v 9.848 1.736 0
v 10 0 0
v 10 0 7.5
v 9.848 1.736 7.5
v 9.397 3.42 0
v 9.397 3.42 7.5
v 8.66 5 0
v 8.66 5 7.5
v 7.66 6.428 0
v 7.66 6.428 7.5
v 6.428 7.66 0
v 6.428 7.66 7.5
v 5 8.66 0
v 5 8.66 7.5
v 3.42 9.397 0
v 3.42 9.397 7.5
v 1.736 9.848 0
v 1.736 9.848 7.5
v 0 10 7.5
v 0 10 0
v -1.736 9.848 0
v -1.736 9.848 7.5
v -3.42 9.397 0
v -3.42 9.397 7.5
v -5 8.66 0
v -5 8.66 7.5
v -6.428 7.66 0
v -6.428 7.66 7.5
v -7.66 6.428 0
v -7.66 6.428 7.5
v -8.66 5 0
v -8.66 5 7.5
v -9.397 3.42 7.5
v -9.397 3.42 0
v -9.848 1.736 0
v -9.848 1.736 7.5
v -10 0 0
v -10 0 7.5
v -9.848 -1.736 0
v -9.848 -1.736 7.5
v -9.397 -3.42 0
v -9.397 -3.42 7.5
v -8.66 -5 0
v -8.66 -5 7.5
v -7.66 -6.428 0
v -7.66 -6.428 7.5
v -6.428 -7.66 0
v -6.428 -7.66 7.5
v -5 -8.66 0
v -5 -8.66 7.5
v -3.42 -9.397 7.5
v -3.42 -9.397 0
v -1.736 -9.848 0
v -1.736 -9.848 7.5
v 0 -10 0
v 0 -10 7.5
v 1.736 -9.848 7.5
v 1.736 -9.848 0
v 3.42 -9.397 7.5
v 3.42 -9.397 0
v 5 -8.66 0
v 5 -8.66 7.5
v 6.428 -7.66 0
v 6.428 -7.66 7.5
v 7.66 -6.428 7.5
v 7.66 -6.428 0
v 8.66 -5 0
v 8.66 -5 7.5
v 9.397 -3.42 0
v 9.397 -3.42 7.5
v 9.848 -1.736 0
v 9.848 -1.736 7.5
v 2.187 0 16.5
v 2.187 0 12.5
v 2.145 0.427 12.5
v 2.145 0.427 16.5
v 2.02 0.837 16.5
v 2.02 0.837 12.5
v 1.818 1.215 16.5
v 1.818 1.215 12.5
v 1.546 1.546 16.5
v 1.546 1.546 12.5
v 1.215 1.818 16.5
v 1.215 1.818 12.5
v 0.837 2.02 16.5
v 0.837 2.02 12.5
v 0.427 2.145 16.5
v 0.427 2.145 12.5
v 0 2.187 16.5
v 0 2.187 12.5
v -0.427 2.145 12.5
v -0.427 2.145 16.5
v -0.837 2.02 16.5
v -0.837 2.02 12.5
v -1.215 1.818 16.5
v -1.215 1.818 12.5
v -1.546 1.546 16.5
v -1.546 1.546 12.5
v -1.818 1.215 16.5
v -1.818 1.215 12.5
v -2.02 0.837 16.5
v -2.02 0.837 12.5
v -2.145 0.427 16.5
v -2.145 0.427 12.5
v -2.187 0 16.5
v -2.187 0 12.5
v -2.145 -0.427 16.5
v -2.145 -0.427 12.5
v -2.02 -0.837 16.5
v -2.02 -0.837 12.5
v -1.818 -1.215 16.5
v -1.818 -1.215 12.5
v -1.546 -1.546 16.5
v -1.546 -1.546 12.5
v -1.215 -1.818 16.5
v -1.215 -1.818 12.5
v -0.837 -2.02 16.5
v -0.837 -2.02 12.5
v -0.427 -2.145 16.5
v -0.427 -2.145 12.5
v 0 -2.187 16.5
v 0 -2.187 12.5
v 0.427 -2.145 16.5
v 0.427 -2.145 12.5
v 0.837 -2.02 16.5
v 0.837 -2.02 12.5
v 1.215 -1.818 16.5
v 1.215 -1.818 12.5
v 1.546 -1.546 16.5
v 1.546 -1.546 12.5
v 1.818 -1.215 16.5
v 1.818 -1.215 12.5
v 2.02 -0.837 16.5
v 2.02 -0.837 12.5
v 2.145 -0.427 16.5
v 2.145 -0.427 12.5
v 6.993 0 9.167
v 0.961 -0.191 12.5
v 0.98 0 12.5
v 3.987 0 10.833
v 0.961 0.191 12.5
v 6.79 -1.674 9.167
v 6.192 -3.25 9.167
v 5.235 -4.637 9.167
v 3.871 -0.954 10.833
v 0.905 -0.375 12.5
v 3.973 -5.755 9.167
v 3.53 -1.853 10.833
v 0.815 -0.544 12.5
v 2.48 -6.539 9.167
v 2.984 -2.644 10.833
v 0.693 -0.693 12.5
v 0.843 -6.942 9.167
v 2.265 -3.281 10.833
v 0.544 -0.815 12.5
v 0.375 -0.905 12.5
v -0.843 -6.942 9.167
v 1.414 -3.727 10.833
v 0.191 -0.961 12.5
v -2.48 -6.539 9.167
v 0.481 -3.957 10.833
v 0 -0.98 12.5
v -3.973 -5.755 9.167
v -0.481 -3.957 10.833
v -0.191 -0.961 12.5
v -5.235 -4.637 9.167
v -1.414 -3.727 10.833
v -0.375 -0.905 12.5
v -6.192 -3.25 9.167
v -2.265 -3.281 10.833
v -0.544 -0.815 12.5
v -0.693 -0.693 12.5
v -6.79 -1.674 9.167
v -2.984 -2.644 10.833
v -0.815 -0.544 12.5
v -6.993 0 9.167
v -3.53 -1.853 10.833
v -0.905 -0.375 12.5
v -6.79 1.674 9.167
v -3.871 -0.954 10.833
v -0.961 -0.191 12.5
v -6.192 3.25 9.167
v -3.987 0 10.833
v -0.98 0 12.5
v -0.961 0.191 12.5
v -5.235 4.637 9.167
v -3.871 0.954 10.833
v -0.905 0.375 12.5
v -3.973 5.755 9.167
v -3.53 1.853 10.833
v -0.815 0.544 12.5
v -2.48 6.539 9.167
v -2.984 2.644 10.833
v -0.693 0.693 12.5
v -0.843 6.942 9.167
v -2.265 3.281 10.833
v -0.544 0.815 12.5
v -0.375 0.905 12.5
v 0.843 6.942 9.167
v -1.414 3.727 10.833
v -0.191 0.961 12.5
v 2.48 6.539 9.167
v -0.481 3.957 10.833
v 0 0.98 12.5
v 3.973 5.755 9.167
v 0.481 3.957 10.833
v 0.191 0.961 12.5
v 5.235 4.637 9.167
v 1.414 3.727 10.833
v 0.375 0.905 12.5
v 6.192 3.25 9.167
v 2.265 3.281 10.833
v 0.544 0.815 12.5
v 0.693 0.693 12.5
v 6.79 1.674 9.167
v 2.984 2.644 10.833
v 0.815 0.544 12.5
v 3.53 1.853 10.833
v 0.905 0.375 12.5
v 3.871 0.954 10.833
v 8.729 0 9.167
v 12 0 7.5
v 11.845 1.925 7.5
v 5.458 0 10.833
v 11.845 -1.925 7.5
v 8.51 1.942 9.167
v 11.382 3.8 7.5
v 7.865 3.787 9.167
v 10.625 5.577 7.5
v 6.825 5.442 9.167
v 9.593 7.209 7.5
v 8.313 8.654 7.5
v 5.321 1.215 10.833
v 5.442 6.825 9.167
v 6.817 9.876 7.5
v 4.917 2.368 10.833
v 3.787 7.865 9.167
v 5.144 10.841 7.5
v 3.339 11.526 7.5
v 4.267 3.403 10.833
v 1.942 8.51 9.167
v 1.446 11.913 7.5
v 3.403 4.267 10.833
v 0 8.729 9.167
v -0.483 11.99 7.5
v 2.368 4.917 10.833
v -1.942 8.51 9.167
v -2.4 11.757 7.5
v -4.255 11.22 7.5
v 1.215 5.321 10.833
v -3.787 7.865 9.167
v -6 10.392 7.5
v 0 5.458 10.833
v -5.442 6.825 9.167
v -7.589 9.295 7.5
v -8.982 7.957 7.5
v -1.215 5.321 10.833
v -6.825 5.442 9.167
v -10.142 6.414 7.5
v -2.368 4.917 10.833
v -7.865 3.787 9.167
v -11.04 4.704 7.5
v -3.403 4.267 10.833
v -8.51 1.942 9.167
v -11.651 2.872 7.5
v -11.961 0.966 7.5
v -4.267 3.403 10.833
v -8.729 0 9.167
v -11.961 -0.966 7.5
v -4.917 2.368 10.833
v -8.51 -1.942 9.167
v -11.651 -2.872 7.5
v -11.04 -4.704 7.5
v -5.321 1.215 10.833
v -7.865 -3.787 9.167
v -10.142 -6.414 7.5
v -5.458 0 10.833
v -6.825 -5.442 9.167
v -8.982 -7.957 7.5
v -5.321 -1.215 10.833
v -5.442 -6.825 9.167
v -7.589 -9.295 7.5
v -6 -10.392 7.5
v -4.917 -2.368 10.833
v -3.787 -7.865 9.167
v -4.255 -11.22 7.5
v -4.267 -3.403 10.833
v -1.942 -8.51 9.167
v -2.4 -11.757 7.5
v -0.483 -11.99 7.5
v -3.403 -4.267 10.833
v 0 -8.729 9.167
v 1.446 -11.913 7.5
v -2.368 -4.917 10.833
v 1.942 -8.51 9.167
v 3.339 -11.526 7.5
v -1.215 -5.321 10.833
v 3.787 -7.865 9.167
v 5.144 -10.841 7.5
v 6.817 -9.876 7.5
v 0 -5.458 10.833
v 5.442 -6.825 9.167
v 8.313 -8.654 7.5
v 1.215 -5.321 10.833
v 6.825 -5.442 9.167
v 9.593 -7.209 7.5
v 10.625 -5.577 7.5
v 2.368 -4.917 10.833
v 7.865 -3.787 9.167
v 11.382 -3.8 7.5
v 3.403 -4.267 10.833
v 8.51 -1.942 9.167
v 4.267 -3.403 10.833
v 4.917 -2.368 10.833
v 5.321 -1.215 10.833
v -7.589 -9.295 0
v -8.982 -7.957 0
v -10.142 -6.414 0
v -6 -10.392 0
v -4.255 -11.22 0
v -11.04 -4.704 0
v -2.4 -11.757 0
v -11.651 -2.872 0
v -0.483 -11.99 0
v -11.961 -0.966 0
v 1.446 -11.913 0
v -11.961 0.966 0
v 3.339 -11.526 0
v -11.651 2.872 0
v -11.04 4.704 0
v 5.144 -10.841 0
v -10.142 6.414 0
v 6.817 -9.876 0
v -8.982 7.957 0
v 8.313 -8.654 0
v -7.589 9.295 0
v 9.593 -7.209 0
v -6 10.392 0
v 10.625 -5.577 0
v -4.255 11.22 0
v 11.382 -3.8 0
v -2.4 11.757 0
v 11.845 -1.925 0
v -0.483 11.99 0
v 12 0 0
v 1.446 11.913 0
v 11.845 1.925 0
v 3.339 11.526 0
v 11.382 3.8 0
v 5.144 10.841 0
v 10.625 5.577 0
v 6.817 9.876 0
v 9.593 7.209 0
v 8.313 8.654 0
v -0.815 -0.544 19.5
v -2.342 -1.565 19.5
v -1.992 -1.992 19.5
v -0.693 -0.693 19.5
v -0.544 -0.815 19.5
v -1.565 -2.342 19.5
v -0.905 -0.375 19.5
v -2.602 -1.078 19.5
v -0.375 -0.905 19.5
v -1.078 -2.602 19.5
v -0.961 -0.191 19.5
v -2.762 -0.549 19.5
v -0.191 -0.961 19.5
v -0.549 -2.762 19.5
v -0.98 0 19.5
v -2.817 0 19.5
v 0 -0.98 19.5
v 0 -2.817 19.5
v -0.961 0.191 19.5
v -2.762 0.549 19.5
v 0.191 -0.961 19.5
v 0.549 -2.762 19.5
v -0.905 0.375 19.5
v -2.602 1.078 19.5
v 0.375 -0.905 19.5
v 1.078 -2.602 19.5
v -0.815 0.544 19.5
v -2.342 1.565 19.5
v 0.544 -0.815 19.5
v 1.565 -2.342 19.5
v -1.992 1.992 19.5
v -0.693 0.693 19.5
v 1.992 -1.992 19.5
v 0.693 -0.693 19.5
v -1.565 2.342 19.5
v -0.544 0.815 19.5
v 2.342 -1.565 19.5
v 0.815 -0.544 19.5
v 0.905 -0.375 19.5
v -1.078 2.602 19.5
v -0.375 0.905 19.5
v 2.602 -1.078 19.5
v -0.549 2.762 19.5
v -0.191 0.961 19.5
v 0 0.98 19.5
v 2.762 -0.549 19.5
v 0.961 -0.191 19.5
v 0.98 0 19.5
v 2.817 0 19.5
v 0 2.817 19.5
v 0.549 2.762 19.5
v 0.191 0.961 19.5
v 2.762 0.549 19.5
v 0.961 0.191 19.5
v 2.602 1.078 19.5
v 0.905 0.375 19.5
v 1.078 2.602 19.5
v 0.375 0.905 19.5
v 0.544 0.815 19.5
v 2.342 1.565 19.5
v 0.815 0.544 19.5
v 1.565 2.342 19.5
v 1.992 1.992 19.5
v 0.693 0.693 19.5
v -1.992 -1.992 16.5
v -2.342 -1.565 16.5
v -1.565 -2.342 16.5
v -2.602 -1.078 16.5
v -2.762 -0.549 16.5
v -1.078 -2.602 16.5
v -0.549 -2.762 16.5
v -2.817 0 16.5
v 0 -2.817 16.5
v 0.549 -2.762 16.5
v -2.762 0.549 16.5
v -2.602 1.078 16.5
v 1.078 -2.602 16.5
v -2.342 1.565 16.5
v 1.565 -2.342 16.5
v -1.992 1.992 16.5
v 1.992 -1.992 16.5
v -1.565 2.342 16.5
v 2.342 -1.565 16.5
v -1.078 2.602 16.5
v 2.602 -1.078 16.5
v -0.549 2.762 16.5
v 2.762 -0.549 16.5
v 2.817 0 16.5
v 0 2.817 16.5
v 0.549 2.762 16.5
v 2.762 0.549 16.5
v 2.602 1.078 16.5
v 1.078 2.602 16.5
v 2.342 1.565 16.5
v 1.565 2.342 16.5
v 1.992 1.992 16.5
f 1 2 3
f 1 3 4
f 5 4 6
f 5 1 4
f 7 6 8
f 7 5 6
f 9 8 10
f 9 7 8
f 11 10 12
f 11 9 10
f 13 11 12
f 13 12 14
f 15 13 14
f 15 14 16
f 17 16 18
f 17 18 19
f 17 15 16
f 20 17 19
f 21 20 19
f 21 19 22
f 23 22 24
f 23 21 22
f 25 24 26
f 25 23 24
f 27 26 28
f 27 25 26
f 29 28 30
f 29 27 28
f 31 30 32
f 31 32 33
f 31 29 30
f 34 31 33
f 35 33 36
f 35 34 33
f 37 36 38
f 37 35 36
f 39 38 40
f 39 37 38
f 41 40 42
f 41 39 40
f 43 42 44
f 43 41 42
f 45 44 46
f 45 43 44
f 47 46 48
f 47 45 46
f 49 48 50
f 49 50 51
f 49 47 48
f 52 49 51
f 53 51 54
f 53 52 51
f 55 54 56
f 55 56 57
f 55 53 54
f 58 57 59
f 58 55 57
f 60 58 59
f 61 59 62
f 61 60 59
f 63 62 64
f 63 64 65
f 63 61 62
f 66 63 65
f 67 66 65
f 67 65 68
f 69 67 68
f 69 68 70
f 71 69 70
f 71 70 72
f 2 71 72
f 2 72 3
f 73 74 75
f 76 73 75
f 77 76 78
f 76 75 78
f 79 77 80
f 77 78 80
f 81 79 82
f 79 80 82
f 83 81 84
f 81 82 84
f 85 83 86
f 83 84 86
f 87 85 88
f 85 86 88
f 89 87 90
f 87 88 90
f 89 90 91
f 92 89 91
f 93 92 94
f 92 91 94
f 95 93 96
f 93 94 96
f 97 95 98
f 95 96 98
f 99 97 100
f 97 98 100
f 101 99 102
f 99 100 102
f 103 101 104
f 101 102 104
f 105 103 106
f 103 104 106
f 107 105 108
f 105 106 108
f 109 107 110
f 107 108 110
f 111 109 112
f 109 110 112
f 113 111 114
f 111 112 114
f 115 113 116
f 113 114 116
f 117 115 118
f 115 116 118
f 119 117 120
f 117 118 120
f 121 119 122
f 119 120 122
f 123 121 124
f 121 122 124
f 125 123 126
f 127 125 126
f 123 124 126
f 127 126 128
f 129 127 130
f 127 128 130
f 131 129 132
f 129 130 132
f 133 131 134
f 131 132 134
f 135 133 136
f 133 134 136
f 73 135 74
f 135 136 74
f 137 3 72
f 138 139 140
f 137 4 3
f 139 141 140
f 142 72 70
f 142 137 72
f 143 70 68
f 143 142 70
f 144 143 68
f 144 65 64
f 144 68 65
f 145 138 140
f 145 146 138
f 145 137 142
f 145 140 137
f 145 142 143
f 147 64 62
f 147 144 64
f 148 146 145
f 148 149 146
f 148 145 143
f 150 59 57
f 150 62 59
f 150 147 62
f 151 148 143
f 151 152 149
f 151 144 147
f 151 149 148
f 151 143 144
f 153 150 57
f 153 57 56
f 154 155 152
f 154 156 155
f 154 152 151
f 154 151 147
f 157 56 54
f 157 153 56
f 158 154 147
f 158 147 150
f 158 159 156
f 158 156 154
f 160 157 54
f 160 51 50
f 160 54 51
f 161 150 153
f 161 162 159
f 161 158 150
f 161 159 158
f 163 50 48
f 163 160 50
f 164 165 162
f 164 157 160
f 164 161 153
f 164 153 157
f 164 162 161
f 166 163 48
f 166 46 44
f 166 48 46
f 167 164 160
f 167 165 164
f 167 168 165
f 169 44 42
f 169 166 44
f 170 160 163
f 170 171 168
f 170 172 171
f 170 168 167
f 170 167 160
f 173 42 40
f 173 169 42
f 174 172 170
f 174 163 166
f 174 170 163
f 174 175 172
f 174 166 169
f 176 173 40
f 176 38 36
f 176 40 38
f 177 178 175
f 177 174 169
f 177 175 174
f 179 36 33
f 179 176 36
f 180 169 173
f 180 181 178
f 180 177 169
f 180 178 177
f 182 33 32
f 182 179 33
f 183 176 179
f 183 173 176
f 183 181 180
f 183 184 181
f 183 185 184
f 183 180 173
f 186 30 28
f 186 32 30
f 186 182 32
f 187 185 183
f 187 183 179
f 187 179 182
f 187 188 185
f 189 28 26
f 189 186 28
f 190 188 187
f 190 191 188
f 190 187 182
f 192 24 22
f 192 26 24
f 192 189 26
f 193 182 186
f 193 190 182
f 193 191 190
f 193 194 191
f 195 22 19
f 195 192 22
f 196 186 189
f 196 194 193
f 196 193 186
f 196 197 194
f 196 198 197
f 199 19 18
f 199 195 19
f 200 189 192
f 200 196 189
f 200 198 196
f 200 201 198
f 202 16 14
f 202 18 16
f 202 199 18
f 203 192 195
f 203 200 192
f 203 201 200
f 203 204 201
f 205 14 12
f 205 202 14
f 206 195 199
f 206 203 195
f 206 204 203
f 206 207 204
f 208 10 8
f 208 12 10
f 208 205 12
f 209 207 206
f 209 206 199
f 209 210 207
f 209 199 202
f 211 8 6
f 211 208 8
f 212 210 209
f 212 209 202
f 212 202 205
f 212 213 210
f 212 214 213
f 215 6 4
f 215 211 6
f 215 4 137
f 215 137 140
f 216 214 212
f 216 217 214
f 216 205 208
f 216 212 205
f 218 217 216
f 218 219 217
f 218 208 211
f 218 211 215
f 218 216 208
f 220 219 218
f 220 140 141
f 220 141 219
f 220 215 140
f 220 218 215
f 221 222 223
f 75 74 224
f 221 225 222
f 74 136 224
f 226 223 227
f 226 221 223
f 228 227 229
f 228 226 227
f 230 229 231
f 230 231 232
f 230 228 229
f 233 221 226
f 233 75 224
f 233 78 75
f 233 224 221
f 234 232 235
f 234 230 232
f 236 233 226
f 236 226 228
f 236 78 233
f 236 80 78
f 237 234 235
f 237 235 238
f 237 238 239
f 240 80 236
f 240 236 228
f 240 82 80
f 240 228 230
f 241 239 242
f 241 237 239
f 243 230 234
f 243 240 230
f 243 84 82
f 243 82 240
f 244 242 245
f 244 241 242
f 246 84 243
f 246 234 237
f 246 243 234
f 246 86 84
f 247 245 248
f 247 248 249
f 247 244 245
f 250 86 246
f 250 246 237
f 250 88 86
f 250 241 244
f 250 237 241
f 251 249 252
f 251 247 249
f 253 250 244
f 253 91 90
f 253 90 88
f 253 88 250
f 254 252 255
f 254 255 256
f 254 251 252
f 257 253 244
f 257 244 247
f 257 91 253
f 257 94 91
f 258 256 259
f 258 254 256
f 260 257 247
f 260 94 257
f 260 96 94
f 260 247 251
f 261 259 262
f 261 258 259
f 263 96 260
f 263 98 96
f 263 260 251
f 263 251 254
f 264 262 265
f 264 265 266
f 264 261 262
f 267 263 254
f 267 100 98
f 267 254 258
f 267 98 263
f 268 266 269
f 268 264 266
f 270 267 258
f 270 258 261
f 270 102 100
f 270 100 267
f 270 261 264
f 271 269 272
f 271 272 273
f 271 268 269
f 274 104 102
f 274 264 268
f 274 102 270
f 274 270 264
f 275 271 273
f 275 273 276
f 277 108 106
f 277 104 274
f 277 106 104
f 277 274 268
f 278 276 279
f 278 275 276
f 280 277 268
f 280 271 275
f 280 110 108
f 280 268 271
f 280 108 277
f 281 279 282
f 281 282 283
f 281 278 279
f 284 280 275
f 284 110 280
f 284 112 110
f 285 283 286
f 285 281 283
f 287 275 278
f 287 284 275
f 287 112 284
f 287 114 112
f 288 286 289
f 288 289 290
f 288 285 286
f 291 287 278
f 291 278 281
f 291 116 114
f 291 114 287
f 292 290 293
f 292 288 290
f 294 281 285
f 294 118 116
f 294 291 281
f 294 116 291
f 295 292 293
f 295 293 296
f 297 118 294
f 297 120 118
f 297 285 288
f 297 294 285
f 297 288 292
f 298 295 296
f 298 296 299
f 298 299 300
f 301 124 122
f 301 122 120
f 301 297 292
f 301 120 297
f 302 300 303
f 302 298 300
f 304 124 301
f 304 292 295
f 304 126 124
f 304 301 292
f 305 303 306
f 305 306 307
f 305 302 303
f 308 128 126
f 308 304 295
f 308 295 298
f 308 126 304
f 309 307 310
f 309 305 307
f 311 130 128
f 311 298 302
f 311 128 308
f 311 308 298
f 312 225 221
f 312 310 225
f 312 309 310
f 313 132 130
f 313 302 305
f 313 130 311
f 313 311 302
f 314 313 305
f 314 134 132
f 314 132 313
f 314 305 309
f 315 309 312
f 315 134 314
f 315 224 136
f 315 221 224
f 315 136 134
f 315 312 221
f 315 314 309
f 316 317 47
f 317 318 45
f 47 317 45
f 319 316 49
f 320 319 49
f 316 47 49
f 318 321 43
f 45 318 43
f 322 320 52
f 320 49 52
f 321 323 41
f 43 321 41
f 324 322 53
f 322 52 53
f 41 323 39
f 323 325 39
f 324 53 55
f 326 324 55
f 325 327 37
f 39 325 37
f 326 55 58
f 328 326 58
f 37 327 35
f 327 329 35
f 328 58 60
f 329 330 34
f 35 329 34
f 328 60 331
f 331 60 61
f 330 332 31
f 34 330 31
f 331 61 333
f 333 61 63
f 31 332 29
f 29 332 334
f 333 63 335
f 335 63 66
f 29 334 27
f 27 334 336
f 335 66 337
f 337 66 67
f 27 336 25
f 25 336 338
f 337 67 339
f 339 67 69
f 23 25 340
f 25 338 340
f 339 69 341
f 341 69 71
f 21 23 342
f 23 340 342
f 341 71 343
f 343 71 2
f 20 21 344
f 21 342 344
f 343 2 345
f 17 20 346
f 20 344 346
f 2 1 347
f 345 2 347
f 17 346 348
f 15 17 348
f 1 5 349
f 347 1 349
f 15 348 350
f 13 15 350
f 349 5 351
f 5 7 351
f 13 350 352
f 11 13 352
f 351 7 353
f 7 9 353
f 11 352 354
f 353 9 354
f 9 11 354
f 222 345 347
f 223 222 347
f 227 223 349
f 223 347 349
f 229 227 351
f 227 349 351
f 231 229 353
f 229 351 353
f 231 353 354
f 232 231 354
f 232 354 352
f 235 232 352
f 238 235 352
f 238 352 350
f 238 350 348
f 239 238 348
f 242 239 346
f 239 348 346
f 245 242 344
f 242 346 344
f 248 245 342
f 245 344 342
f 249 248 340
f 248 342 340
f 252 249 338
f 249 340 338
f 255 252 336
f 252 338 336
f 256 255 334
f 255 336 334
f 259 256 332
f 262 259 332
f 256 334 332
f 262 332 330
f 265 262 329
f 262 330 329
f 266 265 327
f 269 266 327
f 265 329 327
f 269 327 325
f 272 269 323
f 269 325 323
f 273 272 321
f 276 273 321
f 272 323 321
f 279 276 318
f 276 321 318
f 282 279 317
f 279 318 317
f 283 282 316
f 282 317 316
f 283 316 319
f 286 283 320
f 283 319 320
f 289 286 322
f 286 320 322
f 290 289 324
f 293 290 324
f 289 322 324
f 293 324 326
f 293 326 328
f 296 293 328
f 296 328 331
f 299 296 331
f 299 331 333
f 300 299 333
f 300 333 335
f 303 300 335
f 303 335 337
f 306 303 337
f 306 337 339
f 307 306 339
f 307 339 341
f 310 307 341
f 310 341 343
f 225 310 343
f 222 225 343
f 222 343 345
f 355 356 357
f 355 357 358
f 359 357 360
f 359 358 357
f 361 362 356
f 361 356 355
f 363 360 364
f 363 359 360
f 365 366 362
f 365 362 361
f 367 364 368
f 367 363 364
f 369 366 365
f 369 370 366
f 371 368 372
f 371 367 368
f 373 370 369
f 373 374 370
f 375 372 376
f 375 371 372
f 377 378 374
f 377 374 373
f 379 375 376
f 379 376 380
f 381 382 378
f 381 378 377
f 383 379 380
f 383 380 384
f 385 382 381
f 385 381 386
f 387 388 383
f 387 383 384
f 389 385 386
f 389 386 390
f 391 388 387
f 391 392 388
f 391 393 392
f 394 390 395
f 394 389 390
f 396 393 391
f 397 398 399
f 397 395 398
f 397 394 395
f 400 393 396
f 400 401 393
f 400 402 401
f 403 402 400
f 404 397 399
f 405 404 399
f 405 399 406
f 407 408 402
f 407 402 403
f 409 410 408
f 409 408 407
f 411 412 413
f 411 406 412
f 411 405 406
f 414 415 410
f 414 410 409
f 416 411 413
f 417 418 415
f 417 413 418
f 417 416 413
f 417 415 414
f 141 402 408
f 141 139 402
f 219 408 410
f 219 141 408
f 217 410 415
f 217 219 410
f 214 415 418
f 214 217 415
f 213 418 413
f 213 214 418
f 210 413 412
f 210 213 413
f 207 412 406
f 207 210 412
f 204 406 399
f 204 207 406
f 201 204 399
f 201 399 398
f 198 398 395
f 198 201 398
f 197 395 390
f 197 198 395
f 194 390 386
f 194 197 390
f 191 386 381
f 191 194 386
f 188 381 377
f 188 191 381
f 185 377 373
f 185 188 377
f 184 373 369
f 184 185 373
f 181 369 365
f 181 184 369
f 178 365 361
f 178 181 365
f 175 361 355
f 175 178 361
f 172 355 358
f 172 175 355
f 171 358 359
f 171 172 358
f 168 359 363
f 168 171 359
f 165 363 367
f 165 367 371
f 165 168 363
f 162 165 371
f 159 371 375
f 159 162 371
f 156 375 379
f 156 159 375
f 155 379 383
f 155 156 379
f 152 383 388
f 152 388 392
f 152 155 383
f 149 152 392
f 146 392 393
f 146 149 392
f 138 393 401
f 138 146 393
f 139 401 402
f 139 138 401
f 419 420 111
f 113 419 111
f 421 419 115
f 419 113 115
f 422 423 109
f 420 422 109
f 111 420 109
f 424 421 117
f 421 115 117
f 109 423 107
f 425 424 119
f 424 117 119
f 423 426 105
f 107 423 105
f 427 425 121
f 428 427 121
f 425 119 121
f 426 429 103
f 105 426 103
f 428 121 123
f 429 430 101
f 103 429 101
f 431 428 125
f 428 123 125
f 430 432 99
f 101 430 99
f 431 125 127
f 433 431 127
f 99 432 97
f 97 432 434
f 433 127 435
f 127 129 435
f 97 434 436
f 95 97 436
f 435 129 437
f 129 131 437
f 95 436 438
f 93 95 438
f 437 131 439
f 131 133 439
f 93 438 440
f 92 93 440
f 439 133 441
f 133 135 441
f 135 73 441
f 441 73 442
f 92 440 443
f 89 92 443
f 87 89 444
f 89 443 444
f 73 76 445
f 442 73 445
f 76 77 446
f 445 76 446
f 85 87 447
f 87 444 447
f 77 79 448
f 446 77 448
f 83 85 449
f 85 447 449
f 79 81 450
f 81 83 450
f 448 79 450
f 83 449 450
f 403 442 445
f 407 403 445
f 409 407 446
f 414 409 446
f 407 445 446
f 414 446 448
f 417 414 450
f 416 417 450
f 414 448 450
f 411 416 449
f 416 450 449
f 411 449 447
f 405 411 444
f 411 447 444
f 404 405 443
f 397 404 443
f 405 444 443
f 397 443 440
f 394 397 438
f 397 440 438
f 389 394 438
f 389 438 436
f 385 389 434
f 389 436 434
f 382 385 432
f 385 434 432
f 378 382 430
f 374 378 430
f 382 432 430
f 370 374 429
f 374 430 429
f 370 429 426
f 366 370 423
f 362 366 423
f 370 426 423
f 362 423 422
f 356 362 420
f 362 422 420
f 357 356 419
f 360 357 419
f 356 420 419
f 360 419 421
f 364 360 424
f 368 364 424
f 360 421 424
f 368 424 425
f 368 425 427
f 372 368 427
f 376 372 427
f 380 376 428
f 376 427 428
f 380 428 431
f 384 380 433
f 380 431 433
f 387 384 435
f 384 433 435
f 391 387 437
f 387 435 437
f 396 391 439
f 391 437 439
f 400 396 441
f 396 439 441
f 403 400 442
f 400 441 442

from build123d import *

# Parameters (mm, degrees)
F0_R     = 12
F0_R_2   = 10
F1_DEPTH = 7.5
F2_R     = 12
F3_DEPTH = 5
F3_TAPER = 63
F4_R     = 10
F5_DEPTH = 5
F5_TAPER = 61
F6_R     = 2.1869474725
F6_R_2   = 0.9797612236
F7_DEPTH = 4
F8_R     = 2.8165068541
F8_R_2   = 2.1869474725
F8_R_3   = 0.9797612236
F9_DEPTH = 3


with BuildPart() as f1:
    # F0 (on Top) → F1 (new body)
    with BuildSketch(Plane.XY):
        Circle(F0_R)
        Circle(F0_R_2, mode=Mode.SUBTRACT)
    extrude(amount=F1_DEPTH)

    # F2 (on face) → F3 (join)
    with BuildSketch(Plane.XY.offset(7.5)):
        Circle(F2_R)
    extrude(amount=F3_DEPTH, taper=F3_TAPER)

    # F4 (on face) → F5 (cut)
    with BuildSketch(Plane(origin=(0, 0, 7.5), x_dir=(1, 0, 0), z_dir=(0, 0, -1))):
        Circle(F4_R)
    extrude(amount=-F5_DEPTH, taper=F5_TAPER, mode=Mode.SUBTRACT)

    # F6 (on face) → F7 (join)
    with BuildSketch(Plane.XY.offset(12.5)):
        Circle(F6_R)
        Circle(F6_R_2, mode=Mode.SUBTRACT)
    extrude(amount=F7_DEPTH)

    # F8 (on face) → F9 (join)
    with BuildSketch(Plane.XY.offset(16.5)):
        Circle(F8_R)
        Circle(F8_R_2, mode=Mode.SUBTRACT)
        Circle(F8_R_2)
        Circle(F8_R_3, mode=Mode.SUBTRACT)
    extrude(amount=F9_DEPTH)


solid = f1.part
